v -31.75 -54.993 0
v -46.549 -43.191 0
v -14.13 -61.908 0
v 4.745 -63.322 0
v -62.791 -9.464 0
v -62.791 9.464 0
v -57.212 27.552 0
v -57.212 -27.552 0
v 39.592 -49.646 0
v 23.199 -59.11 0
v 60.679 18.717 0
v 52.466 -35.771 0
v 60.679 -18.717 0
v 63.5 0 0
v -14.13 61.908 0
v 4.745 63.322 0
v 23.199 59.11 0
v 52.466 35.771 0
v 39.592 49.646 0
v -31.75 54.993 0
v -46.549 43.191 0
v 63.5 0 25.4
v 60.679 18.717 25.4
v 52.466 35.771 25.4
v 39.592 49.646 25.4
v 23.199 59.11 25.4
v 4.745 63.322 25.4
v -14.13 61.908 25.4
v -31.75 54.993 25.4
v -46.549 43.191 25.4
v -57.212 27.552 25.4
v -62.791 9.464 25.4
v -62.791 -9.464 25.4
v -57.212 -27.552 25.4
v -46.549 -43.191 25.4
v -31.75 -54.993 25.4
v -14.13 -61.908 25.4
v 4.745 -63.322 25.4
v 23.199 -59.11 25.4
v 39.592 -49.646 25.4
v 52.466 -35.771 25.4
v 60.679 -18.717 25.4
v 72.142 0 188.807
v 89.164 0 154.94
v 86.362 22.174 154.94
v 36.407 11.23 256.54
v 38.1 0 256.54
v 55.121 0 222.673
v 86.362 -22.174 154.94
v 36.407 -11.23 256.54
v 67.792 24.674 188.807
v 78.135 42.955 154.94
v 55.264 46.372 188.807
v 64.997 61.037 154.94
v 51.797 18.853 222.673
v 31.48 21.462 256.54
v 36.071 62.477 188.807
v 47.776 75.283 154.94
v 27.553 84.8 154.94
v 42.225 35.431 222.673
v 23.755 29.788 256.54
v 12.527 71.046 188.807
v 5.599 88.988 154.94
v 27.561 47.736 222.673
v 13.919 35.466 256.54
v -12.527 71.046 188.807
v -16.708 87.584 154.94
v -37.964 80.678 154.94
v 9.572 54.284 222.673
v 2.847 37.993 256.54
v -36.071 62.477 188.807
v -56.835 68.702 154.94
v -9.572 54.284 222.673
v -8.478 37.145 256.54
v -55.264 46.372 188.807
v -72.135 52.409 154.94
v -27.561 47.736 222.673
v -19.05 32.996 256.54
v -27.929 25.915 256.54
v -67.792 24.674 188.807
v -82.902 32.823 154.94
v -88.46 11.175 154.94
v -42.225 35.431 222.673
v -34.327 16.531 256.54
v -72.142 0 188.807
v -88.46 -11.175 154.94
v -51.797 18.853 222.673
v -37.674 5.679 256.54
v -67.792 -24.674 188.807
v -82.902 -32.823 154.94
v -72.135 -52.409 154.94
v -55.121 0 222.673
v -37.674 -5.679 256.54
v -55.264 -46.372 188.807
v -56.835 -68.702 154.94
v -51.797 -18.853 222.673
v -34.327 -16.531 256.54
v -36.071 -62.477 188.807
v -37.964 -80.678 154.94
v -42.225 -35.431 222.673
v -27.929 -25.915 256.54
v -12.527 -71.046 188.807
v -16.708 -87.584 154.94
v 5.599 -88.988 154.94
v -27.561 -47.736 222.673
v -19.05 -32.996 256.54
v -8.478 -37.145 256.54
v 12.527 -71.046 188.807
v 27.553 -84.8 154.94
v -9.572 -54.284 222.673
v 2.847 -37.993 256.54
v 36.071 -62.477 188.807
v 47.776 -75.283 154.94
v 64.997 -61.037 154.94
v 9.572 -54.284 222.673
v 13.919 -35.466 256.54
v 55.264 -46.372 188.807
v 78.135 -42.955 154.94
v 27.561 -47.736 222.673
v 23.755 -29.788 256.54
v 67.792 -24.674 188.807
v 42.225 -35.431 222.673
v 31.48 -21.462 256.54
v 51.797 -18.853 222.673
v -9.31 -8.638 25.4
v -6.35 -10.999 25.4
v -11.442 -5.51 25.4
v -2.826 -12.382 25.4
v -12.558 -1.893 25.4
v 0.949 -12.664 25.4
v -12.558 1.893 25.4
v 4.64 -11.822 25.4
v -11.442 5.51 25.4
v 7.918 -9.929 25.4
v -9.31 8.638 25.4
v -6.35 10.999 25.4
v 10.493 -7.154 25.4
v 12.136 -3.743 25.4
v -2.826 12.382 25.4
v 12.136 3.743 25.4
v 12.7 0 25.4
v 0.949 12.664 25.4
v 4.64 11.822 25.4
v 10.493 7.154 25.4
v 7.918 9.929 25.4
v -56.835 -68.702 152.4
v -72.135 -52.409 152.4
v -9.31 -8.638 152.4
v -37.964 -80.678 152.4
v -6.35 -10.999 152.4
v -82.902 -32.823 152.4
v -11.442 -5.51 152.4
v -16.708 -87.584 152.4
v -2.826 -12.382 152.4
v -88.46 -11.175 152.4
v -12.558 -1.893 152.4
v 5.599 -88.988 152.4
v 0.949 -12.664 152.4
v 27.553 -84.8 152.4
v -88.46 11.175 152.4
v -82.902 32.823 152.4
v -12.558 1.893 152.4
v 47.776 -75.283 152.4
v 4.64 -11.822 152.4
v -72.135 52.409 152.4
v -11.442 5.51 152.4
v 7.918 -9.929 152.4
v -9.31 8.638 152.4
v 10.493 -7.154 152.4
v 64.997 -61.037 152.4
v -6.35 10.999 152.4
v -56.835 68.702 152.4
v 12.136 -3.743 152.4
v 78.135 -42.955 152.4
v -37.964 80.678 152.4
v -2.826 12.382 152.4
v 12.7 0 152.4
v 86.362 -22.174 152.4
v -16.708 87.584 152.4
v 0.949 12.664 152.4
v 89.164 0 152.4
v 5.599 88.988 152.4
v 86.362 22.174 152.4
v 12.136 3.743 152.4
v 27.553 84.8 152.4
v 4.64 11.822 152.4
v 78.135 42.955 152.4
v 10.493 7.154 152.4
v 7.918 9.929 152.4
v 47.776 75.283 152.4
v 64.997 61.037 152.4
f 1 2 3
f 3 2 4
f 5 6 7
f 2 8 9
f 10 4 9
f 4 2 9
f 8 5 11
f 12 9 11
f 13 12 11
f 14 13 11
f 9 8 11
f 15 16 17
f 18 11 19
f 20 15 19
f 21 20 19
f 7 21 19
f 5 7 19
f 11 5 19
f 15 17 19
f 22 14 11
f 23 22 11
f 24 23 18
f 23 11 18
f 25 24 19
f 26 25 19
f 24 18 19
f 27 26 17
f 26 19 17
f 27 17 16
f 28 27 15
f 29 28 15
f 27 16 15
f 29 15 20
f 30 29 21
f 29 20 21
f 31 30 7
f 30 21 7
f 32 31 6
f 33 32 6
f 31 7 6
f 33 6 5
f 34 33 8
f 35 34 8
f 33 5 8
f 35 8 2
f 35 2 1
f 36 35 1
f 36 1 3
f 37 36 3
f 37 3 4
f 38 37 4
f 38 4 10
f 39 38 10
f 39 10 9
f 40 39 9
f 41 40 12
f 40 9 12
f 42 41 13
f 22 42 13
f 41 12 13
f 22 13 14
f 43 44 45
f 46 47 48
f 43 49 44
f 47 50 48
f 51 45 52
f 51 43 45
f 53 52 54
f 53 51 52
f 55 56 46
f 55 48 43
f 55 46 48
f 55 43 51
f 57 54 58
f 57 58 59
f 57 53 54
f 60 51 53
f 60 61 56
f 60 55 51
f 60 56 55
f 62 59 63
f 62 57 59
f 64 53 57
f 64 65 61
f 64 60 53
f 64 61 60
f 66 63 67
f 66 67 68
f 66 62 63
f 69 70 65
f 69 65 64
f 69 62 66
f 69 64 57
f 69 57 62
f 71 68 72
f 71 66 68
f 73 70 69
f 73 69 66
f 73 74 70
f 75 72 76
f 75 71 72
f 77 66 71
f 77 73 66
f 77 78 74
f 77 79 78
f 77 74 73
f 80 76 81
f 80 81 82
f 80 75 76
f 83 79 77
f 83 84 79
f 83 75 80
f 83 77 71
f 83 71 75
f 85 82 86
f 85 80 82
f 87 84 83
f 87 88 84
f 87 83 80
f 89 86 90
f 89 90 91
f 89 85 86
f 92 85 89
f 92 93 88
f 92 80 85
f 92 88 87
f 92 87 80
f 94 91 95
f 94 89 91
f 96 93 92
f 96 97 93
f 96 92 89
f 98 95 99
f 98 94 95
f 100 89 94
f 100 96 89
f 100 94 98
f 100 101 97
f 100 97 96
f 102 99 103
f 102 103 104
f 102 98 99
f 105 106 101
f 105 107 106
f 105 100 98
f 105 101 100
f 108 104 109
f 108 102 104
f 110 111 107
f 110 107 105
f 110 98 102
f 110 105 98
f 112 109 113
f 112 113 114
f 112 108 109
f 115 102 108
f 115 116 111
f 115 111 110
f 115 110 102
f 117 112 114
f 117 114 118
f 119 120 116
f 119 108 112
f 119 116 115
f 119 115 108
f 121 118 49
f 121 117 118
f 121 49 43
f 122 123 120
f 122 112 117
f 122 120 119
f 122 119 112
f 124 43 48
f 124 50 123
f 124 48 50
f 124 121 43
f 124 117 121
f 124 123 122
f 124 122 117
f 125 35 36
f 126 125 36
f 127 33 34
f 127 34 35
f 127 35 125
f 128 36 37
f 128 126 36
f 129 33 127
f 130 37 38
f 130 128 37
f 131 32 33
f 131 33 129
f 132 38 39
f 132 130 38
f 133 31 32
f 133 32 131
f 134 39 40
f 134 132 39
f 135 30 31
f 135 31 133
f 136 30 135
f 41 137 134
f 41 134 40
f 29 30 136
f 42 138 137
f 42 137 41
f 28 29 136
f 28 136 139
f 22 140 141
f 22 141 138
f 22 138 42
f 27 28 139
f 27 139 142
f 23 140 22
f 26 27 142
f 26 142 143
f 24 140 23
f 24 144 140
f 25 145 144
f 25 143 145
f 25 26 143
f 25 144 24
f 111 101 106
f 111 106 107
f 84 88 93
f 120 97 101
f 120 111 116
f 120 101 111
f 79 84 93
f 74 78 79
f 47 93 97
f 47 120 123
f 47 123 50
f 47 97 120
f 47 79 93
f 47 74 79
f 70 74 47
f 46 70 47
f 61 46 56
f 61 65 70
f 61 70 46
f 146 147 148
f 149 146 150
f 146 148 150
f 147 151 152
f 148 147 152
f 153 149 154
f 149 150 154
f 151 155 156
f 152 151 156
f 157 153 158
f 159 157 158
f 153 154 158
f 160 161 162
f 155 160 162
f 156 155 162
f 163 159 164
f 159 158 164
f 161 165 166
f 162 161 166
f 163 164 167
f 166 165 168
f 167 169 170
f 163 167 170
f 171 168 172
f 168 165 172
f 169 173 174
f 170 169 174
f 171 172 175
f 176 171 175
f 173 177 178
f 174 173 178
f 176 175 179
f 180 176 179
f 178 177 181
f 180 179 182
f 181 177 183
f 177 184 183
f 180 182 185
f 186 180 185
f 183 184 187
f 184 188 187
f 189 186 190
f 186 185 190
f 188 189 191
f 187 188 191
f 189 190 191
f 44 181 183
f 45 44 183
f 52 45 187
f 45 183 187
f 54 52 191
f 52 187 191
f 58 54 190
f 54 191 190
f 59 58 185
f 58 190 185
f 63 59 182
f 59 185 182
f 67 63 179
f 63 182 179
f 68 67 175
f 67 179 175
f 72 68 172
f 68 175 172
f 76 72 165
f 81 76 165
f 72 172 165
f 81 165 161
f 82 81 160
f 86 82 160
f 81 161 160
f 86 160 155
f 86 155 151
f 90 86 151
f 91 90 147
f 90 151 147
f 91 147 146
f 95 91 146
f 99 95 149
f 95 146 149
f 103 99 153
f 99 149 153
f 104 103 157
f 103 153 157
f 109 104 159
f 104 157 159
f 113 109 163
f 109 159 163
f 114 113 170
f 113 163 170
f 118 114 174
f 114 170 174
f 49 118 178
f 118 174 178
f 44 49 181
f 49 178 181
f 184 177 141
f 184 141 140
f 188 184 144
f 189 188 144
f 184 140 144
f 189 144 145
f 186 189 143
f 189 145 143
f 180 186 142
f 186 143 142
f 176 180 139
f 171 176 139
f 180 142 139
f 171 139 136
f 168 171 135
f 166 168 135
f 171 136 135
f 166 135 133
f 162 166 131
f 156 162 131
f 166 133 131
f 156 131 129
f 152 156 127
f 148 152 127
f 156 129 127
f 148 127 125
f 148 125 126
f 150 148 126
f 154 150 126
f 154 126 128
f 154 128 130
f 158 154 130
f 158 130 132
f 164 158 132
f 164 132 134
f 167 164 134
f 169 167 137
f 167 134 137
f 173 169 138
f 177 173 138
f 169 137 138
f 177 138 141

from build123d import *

# Parameters (mm, degrees)
F0_R      = 63.5
F1_DEPTH  = 25.4
F2_R      = 12.7
F3_DEPTH  = 127
F4_R      = 89.163548
F4_R_2    = 12.7
F5_DEPTH  = 2.54
F5_FACE_R = 89.163548
F7_R      = 38.1


with BuildPart() as f1:
    # F0 (on Top) → F1 (new body)
    with BuildSketch(Plane.XY):
        Circle(F0_R)
    extrude(amount=F1_DEPTH)

    # F2 (on face) → F3 (join)
    with BuildSketch(Plane.XY.offset(25.4)):
        Circle(F2_R)
    extrude(amount=F3_DEPTH)

    # F4 (on face) → F5 (join)
    with BuildSketch(Plane.XY.offset(152.4)):
        Circle(F4_R)
        Circle(F4_R_2, mode=Mode.SUBTRACT)
        Circle(F4_R_2)
    extrude(amount=F5_DEPTH)

    # F5_face (on face) → F8 section 0
    with BuildSketch(Plane.XY.offset(154.94)):
        Circle(F5_FACE_R)
    # F7 (on offset) → F8 section 1
    with BuildSketch(Plane.XY.offset(256.54)):
        Circle(F7_R)
    loft()


solid = f1.part
